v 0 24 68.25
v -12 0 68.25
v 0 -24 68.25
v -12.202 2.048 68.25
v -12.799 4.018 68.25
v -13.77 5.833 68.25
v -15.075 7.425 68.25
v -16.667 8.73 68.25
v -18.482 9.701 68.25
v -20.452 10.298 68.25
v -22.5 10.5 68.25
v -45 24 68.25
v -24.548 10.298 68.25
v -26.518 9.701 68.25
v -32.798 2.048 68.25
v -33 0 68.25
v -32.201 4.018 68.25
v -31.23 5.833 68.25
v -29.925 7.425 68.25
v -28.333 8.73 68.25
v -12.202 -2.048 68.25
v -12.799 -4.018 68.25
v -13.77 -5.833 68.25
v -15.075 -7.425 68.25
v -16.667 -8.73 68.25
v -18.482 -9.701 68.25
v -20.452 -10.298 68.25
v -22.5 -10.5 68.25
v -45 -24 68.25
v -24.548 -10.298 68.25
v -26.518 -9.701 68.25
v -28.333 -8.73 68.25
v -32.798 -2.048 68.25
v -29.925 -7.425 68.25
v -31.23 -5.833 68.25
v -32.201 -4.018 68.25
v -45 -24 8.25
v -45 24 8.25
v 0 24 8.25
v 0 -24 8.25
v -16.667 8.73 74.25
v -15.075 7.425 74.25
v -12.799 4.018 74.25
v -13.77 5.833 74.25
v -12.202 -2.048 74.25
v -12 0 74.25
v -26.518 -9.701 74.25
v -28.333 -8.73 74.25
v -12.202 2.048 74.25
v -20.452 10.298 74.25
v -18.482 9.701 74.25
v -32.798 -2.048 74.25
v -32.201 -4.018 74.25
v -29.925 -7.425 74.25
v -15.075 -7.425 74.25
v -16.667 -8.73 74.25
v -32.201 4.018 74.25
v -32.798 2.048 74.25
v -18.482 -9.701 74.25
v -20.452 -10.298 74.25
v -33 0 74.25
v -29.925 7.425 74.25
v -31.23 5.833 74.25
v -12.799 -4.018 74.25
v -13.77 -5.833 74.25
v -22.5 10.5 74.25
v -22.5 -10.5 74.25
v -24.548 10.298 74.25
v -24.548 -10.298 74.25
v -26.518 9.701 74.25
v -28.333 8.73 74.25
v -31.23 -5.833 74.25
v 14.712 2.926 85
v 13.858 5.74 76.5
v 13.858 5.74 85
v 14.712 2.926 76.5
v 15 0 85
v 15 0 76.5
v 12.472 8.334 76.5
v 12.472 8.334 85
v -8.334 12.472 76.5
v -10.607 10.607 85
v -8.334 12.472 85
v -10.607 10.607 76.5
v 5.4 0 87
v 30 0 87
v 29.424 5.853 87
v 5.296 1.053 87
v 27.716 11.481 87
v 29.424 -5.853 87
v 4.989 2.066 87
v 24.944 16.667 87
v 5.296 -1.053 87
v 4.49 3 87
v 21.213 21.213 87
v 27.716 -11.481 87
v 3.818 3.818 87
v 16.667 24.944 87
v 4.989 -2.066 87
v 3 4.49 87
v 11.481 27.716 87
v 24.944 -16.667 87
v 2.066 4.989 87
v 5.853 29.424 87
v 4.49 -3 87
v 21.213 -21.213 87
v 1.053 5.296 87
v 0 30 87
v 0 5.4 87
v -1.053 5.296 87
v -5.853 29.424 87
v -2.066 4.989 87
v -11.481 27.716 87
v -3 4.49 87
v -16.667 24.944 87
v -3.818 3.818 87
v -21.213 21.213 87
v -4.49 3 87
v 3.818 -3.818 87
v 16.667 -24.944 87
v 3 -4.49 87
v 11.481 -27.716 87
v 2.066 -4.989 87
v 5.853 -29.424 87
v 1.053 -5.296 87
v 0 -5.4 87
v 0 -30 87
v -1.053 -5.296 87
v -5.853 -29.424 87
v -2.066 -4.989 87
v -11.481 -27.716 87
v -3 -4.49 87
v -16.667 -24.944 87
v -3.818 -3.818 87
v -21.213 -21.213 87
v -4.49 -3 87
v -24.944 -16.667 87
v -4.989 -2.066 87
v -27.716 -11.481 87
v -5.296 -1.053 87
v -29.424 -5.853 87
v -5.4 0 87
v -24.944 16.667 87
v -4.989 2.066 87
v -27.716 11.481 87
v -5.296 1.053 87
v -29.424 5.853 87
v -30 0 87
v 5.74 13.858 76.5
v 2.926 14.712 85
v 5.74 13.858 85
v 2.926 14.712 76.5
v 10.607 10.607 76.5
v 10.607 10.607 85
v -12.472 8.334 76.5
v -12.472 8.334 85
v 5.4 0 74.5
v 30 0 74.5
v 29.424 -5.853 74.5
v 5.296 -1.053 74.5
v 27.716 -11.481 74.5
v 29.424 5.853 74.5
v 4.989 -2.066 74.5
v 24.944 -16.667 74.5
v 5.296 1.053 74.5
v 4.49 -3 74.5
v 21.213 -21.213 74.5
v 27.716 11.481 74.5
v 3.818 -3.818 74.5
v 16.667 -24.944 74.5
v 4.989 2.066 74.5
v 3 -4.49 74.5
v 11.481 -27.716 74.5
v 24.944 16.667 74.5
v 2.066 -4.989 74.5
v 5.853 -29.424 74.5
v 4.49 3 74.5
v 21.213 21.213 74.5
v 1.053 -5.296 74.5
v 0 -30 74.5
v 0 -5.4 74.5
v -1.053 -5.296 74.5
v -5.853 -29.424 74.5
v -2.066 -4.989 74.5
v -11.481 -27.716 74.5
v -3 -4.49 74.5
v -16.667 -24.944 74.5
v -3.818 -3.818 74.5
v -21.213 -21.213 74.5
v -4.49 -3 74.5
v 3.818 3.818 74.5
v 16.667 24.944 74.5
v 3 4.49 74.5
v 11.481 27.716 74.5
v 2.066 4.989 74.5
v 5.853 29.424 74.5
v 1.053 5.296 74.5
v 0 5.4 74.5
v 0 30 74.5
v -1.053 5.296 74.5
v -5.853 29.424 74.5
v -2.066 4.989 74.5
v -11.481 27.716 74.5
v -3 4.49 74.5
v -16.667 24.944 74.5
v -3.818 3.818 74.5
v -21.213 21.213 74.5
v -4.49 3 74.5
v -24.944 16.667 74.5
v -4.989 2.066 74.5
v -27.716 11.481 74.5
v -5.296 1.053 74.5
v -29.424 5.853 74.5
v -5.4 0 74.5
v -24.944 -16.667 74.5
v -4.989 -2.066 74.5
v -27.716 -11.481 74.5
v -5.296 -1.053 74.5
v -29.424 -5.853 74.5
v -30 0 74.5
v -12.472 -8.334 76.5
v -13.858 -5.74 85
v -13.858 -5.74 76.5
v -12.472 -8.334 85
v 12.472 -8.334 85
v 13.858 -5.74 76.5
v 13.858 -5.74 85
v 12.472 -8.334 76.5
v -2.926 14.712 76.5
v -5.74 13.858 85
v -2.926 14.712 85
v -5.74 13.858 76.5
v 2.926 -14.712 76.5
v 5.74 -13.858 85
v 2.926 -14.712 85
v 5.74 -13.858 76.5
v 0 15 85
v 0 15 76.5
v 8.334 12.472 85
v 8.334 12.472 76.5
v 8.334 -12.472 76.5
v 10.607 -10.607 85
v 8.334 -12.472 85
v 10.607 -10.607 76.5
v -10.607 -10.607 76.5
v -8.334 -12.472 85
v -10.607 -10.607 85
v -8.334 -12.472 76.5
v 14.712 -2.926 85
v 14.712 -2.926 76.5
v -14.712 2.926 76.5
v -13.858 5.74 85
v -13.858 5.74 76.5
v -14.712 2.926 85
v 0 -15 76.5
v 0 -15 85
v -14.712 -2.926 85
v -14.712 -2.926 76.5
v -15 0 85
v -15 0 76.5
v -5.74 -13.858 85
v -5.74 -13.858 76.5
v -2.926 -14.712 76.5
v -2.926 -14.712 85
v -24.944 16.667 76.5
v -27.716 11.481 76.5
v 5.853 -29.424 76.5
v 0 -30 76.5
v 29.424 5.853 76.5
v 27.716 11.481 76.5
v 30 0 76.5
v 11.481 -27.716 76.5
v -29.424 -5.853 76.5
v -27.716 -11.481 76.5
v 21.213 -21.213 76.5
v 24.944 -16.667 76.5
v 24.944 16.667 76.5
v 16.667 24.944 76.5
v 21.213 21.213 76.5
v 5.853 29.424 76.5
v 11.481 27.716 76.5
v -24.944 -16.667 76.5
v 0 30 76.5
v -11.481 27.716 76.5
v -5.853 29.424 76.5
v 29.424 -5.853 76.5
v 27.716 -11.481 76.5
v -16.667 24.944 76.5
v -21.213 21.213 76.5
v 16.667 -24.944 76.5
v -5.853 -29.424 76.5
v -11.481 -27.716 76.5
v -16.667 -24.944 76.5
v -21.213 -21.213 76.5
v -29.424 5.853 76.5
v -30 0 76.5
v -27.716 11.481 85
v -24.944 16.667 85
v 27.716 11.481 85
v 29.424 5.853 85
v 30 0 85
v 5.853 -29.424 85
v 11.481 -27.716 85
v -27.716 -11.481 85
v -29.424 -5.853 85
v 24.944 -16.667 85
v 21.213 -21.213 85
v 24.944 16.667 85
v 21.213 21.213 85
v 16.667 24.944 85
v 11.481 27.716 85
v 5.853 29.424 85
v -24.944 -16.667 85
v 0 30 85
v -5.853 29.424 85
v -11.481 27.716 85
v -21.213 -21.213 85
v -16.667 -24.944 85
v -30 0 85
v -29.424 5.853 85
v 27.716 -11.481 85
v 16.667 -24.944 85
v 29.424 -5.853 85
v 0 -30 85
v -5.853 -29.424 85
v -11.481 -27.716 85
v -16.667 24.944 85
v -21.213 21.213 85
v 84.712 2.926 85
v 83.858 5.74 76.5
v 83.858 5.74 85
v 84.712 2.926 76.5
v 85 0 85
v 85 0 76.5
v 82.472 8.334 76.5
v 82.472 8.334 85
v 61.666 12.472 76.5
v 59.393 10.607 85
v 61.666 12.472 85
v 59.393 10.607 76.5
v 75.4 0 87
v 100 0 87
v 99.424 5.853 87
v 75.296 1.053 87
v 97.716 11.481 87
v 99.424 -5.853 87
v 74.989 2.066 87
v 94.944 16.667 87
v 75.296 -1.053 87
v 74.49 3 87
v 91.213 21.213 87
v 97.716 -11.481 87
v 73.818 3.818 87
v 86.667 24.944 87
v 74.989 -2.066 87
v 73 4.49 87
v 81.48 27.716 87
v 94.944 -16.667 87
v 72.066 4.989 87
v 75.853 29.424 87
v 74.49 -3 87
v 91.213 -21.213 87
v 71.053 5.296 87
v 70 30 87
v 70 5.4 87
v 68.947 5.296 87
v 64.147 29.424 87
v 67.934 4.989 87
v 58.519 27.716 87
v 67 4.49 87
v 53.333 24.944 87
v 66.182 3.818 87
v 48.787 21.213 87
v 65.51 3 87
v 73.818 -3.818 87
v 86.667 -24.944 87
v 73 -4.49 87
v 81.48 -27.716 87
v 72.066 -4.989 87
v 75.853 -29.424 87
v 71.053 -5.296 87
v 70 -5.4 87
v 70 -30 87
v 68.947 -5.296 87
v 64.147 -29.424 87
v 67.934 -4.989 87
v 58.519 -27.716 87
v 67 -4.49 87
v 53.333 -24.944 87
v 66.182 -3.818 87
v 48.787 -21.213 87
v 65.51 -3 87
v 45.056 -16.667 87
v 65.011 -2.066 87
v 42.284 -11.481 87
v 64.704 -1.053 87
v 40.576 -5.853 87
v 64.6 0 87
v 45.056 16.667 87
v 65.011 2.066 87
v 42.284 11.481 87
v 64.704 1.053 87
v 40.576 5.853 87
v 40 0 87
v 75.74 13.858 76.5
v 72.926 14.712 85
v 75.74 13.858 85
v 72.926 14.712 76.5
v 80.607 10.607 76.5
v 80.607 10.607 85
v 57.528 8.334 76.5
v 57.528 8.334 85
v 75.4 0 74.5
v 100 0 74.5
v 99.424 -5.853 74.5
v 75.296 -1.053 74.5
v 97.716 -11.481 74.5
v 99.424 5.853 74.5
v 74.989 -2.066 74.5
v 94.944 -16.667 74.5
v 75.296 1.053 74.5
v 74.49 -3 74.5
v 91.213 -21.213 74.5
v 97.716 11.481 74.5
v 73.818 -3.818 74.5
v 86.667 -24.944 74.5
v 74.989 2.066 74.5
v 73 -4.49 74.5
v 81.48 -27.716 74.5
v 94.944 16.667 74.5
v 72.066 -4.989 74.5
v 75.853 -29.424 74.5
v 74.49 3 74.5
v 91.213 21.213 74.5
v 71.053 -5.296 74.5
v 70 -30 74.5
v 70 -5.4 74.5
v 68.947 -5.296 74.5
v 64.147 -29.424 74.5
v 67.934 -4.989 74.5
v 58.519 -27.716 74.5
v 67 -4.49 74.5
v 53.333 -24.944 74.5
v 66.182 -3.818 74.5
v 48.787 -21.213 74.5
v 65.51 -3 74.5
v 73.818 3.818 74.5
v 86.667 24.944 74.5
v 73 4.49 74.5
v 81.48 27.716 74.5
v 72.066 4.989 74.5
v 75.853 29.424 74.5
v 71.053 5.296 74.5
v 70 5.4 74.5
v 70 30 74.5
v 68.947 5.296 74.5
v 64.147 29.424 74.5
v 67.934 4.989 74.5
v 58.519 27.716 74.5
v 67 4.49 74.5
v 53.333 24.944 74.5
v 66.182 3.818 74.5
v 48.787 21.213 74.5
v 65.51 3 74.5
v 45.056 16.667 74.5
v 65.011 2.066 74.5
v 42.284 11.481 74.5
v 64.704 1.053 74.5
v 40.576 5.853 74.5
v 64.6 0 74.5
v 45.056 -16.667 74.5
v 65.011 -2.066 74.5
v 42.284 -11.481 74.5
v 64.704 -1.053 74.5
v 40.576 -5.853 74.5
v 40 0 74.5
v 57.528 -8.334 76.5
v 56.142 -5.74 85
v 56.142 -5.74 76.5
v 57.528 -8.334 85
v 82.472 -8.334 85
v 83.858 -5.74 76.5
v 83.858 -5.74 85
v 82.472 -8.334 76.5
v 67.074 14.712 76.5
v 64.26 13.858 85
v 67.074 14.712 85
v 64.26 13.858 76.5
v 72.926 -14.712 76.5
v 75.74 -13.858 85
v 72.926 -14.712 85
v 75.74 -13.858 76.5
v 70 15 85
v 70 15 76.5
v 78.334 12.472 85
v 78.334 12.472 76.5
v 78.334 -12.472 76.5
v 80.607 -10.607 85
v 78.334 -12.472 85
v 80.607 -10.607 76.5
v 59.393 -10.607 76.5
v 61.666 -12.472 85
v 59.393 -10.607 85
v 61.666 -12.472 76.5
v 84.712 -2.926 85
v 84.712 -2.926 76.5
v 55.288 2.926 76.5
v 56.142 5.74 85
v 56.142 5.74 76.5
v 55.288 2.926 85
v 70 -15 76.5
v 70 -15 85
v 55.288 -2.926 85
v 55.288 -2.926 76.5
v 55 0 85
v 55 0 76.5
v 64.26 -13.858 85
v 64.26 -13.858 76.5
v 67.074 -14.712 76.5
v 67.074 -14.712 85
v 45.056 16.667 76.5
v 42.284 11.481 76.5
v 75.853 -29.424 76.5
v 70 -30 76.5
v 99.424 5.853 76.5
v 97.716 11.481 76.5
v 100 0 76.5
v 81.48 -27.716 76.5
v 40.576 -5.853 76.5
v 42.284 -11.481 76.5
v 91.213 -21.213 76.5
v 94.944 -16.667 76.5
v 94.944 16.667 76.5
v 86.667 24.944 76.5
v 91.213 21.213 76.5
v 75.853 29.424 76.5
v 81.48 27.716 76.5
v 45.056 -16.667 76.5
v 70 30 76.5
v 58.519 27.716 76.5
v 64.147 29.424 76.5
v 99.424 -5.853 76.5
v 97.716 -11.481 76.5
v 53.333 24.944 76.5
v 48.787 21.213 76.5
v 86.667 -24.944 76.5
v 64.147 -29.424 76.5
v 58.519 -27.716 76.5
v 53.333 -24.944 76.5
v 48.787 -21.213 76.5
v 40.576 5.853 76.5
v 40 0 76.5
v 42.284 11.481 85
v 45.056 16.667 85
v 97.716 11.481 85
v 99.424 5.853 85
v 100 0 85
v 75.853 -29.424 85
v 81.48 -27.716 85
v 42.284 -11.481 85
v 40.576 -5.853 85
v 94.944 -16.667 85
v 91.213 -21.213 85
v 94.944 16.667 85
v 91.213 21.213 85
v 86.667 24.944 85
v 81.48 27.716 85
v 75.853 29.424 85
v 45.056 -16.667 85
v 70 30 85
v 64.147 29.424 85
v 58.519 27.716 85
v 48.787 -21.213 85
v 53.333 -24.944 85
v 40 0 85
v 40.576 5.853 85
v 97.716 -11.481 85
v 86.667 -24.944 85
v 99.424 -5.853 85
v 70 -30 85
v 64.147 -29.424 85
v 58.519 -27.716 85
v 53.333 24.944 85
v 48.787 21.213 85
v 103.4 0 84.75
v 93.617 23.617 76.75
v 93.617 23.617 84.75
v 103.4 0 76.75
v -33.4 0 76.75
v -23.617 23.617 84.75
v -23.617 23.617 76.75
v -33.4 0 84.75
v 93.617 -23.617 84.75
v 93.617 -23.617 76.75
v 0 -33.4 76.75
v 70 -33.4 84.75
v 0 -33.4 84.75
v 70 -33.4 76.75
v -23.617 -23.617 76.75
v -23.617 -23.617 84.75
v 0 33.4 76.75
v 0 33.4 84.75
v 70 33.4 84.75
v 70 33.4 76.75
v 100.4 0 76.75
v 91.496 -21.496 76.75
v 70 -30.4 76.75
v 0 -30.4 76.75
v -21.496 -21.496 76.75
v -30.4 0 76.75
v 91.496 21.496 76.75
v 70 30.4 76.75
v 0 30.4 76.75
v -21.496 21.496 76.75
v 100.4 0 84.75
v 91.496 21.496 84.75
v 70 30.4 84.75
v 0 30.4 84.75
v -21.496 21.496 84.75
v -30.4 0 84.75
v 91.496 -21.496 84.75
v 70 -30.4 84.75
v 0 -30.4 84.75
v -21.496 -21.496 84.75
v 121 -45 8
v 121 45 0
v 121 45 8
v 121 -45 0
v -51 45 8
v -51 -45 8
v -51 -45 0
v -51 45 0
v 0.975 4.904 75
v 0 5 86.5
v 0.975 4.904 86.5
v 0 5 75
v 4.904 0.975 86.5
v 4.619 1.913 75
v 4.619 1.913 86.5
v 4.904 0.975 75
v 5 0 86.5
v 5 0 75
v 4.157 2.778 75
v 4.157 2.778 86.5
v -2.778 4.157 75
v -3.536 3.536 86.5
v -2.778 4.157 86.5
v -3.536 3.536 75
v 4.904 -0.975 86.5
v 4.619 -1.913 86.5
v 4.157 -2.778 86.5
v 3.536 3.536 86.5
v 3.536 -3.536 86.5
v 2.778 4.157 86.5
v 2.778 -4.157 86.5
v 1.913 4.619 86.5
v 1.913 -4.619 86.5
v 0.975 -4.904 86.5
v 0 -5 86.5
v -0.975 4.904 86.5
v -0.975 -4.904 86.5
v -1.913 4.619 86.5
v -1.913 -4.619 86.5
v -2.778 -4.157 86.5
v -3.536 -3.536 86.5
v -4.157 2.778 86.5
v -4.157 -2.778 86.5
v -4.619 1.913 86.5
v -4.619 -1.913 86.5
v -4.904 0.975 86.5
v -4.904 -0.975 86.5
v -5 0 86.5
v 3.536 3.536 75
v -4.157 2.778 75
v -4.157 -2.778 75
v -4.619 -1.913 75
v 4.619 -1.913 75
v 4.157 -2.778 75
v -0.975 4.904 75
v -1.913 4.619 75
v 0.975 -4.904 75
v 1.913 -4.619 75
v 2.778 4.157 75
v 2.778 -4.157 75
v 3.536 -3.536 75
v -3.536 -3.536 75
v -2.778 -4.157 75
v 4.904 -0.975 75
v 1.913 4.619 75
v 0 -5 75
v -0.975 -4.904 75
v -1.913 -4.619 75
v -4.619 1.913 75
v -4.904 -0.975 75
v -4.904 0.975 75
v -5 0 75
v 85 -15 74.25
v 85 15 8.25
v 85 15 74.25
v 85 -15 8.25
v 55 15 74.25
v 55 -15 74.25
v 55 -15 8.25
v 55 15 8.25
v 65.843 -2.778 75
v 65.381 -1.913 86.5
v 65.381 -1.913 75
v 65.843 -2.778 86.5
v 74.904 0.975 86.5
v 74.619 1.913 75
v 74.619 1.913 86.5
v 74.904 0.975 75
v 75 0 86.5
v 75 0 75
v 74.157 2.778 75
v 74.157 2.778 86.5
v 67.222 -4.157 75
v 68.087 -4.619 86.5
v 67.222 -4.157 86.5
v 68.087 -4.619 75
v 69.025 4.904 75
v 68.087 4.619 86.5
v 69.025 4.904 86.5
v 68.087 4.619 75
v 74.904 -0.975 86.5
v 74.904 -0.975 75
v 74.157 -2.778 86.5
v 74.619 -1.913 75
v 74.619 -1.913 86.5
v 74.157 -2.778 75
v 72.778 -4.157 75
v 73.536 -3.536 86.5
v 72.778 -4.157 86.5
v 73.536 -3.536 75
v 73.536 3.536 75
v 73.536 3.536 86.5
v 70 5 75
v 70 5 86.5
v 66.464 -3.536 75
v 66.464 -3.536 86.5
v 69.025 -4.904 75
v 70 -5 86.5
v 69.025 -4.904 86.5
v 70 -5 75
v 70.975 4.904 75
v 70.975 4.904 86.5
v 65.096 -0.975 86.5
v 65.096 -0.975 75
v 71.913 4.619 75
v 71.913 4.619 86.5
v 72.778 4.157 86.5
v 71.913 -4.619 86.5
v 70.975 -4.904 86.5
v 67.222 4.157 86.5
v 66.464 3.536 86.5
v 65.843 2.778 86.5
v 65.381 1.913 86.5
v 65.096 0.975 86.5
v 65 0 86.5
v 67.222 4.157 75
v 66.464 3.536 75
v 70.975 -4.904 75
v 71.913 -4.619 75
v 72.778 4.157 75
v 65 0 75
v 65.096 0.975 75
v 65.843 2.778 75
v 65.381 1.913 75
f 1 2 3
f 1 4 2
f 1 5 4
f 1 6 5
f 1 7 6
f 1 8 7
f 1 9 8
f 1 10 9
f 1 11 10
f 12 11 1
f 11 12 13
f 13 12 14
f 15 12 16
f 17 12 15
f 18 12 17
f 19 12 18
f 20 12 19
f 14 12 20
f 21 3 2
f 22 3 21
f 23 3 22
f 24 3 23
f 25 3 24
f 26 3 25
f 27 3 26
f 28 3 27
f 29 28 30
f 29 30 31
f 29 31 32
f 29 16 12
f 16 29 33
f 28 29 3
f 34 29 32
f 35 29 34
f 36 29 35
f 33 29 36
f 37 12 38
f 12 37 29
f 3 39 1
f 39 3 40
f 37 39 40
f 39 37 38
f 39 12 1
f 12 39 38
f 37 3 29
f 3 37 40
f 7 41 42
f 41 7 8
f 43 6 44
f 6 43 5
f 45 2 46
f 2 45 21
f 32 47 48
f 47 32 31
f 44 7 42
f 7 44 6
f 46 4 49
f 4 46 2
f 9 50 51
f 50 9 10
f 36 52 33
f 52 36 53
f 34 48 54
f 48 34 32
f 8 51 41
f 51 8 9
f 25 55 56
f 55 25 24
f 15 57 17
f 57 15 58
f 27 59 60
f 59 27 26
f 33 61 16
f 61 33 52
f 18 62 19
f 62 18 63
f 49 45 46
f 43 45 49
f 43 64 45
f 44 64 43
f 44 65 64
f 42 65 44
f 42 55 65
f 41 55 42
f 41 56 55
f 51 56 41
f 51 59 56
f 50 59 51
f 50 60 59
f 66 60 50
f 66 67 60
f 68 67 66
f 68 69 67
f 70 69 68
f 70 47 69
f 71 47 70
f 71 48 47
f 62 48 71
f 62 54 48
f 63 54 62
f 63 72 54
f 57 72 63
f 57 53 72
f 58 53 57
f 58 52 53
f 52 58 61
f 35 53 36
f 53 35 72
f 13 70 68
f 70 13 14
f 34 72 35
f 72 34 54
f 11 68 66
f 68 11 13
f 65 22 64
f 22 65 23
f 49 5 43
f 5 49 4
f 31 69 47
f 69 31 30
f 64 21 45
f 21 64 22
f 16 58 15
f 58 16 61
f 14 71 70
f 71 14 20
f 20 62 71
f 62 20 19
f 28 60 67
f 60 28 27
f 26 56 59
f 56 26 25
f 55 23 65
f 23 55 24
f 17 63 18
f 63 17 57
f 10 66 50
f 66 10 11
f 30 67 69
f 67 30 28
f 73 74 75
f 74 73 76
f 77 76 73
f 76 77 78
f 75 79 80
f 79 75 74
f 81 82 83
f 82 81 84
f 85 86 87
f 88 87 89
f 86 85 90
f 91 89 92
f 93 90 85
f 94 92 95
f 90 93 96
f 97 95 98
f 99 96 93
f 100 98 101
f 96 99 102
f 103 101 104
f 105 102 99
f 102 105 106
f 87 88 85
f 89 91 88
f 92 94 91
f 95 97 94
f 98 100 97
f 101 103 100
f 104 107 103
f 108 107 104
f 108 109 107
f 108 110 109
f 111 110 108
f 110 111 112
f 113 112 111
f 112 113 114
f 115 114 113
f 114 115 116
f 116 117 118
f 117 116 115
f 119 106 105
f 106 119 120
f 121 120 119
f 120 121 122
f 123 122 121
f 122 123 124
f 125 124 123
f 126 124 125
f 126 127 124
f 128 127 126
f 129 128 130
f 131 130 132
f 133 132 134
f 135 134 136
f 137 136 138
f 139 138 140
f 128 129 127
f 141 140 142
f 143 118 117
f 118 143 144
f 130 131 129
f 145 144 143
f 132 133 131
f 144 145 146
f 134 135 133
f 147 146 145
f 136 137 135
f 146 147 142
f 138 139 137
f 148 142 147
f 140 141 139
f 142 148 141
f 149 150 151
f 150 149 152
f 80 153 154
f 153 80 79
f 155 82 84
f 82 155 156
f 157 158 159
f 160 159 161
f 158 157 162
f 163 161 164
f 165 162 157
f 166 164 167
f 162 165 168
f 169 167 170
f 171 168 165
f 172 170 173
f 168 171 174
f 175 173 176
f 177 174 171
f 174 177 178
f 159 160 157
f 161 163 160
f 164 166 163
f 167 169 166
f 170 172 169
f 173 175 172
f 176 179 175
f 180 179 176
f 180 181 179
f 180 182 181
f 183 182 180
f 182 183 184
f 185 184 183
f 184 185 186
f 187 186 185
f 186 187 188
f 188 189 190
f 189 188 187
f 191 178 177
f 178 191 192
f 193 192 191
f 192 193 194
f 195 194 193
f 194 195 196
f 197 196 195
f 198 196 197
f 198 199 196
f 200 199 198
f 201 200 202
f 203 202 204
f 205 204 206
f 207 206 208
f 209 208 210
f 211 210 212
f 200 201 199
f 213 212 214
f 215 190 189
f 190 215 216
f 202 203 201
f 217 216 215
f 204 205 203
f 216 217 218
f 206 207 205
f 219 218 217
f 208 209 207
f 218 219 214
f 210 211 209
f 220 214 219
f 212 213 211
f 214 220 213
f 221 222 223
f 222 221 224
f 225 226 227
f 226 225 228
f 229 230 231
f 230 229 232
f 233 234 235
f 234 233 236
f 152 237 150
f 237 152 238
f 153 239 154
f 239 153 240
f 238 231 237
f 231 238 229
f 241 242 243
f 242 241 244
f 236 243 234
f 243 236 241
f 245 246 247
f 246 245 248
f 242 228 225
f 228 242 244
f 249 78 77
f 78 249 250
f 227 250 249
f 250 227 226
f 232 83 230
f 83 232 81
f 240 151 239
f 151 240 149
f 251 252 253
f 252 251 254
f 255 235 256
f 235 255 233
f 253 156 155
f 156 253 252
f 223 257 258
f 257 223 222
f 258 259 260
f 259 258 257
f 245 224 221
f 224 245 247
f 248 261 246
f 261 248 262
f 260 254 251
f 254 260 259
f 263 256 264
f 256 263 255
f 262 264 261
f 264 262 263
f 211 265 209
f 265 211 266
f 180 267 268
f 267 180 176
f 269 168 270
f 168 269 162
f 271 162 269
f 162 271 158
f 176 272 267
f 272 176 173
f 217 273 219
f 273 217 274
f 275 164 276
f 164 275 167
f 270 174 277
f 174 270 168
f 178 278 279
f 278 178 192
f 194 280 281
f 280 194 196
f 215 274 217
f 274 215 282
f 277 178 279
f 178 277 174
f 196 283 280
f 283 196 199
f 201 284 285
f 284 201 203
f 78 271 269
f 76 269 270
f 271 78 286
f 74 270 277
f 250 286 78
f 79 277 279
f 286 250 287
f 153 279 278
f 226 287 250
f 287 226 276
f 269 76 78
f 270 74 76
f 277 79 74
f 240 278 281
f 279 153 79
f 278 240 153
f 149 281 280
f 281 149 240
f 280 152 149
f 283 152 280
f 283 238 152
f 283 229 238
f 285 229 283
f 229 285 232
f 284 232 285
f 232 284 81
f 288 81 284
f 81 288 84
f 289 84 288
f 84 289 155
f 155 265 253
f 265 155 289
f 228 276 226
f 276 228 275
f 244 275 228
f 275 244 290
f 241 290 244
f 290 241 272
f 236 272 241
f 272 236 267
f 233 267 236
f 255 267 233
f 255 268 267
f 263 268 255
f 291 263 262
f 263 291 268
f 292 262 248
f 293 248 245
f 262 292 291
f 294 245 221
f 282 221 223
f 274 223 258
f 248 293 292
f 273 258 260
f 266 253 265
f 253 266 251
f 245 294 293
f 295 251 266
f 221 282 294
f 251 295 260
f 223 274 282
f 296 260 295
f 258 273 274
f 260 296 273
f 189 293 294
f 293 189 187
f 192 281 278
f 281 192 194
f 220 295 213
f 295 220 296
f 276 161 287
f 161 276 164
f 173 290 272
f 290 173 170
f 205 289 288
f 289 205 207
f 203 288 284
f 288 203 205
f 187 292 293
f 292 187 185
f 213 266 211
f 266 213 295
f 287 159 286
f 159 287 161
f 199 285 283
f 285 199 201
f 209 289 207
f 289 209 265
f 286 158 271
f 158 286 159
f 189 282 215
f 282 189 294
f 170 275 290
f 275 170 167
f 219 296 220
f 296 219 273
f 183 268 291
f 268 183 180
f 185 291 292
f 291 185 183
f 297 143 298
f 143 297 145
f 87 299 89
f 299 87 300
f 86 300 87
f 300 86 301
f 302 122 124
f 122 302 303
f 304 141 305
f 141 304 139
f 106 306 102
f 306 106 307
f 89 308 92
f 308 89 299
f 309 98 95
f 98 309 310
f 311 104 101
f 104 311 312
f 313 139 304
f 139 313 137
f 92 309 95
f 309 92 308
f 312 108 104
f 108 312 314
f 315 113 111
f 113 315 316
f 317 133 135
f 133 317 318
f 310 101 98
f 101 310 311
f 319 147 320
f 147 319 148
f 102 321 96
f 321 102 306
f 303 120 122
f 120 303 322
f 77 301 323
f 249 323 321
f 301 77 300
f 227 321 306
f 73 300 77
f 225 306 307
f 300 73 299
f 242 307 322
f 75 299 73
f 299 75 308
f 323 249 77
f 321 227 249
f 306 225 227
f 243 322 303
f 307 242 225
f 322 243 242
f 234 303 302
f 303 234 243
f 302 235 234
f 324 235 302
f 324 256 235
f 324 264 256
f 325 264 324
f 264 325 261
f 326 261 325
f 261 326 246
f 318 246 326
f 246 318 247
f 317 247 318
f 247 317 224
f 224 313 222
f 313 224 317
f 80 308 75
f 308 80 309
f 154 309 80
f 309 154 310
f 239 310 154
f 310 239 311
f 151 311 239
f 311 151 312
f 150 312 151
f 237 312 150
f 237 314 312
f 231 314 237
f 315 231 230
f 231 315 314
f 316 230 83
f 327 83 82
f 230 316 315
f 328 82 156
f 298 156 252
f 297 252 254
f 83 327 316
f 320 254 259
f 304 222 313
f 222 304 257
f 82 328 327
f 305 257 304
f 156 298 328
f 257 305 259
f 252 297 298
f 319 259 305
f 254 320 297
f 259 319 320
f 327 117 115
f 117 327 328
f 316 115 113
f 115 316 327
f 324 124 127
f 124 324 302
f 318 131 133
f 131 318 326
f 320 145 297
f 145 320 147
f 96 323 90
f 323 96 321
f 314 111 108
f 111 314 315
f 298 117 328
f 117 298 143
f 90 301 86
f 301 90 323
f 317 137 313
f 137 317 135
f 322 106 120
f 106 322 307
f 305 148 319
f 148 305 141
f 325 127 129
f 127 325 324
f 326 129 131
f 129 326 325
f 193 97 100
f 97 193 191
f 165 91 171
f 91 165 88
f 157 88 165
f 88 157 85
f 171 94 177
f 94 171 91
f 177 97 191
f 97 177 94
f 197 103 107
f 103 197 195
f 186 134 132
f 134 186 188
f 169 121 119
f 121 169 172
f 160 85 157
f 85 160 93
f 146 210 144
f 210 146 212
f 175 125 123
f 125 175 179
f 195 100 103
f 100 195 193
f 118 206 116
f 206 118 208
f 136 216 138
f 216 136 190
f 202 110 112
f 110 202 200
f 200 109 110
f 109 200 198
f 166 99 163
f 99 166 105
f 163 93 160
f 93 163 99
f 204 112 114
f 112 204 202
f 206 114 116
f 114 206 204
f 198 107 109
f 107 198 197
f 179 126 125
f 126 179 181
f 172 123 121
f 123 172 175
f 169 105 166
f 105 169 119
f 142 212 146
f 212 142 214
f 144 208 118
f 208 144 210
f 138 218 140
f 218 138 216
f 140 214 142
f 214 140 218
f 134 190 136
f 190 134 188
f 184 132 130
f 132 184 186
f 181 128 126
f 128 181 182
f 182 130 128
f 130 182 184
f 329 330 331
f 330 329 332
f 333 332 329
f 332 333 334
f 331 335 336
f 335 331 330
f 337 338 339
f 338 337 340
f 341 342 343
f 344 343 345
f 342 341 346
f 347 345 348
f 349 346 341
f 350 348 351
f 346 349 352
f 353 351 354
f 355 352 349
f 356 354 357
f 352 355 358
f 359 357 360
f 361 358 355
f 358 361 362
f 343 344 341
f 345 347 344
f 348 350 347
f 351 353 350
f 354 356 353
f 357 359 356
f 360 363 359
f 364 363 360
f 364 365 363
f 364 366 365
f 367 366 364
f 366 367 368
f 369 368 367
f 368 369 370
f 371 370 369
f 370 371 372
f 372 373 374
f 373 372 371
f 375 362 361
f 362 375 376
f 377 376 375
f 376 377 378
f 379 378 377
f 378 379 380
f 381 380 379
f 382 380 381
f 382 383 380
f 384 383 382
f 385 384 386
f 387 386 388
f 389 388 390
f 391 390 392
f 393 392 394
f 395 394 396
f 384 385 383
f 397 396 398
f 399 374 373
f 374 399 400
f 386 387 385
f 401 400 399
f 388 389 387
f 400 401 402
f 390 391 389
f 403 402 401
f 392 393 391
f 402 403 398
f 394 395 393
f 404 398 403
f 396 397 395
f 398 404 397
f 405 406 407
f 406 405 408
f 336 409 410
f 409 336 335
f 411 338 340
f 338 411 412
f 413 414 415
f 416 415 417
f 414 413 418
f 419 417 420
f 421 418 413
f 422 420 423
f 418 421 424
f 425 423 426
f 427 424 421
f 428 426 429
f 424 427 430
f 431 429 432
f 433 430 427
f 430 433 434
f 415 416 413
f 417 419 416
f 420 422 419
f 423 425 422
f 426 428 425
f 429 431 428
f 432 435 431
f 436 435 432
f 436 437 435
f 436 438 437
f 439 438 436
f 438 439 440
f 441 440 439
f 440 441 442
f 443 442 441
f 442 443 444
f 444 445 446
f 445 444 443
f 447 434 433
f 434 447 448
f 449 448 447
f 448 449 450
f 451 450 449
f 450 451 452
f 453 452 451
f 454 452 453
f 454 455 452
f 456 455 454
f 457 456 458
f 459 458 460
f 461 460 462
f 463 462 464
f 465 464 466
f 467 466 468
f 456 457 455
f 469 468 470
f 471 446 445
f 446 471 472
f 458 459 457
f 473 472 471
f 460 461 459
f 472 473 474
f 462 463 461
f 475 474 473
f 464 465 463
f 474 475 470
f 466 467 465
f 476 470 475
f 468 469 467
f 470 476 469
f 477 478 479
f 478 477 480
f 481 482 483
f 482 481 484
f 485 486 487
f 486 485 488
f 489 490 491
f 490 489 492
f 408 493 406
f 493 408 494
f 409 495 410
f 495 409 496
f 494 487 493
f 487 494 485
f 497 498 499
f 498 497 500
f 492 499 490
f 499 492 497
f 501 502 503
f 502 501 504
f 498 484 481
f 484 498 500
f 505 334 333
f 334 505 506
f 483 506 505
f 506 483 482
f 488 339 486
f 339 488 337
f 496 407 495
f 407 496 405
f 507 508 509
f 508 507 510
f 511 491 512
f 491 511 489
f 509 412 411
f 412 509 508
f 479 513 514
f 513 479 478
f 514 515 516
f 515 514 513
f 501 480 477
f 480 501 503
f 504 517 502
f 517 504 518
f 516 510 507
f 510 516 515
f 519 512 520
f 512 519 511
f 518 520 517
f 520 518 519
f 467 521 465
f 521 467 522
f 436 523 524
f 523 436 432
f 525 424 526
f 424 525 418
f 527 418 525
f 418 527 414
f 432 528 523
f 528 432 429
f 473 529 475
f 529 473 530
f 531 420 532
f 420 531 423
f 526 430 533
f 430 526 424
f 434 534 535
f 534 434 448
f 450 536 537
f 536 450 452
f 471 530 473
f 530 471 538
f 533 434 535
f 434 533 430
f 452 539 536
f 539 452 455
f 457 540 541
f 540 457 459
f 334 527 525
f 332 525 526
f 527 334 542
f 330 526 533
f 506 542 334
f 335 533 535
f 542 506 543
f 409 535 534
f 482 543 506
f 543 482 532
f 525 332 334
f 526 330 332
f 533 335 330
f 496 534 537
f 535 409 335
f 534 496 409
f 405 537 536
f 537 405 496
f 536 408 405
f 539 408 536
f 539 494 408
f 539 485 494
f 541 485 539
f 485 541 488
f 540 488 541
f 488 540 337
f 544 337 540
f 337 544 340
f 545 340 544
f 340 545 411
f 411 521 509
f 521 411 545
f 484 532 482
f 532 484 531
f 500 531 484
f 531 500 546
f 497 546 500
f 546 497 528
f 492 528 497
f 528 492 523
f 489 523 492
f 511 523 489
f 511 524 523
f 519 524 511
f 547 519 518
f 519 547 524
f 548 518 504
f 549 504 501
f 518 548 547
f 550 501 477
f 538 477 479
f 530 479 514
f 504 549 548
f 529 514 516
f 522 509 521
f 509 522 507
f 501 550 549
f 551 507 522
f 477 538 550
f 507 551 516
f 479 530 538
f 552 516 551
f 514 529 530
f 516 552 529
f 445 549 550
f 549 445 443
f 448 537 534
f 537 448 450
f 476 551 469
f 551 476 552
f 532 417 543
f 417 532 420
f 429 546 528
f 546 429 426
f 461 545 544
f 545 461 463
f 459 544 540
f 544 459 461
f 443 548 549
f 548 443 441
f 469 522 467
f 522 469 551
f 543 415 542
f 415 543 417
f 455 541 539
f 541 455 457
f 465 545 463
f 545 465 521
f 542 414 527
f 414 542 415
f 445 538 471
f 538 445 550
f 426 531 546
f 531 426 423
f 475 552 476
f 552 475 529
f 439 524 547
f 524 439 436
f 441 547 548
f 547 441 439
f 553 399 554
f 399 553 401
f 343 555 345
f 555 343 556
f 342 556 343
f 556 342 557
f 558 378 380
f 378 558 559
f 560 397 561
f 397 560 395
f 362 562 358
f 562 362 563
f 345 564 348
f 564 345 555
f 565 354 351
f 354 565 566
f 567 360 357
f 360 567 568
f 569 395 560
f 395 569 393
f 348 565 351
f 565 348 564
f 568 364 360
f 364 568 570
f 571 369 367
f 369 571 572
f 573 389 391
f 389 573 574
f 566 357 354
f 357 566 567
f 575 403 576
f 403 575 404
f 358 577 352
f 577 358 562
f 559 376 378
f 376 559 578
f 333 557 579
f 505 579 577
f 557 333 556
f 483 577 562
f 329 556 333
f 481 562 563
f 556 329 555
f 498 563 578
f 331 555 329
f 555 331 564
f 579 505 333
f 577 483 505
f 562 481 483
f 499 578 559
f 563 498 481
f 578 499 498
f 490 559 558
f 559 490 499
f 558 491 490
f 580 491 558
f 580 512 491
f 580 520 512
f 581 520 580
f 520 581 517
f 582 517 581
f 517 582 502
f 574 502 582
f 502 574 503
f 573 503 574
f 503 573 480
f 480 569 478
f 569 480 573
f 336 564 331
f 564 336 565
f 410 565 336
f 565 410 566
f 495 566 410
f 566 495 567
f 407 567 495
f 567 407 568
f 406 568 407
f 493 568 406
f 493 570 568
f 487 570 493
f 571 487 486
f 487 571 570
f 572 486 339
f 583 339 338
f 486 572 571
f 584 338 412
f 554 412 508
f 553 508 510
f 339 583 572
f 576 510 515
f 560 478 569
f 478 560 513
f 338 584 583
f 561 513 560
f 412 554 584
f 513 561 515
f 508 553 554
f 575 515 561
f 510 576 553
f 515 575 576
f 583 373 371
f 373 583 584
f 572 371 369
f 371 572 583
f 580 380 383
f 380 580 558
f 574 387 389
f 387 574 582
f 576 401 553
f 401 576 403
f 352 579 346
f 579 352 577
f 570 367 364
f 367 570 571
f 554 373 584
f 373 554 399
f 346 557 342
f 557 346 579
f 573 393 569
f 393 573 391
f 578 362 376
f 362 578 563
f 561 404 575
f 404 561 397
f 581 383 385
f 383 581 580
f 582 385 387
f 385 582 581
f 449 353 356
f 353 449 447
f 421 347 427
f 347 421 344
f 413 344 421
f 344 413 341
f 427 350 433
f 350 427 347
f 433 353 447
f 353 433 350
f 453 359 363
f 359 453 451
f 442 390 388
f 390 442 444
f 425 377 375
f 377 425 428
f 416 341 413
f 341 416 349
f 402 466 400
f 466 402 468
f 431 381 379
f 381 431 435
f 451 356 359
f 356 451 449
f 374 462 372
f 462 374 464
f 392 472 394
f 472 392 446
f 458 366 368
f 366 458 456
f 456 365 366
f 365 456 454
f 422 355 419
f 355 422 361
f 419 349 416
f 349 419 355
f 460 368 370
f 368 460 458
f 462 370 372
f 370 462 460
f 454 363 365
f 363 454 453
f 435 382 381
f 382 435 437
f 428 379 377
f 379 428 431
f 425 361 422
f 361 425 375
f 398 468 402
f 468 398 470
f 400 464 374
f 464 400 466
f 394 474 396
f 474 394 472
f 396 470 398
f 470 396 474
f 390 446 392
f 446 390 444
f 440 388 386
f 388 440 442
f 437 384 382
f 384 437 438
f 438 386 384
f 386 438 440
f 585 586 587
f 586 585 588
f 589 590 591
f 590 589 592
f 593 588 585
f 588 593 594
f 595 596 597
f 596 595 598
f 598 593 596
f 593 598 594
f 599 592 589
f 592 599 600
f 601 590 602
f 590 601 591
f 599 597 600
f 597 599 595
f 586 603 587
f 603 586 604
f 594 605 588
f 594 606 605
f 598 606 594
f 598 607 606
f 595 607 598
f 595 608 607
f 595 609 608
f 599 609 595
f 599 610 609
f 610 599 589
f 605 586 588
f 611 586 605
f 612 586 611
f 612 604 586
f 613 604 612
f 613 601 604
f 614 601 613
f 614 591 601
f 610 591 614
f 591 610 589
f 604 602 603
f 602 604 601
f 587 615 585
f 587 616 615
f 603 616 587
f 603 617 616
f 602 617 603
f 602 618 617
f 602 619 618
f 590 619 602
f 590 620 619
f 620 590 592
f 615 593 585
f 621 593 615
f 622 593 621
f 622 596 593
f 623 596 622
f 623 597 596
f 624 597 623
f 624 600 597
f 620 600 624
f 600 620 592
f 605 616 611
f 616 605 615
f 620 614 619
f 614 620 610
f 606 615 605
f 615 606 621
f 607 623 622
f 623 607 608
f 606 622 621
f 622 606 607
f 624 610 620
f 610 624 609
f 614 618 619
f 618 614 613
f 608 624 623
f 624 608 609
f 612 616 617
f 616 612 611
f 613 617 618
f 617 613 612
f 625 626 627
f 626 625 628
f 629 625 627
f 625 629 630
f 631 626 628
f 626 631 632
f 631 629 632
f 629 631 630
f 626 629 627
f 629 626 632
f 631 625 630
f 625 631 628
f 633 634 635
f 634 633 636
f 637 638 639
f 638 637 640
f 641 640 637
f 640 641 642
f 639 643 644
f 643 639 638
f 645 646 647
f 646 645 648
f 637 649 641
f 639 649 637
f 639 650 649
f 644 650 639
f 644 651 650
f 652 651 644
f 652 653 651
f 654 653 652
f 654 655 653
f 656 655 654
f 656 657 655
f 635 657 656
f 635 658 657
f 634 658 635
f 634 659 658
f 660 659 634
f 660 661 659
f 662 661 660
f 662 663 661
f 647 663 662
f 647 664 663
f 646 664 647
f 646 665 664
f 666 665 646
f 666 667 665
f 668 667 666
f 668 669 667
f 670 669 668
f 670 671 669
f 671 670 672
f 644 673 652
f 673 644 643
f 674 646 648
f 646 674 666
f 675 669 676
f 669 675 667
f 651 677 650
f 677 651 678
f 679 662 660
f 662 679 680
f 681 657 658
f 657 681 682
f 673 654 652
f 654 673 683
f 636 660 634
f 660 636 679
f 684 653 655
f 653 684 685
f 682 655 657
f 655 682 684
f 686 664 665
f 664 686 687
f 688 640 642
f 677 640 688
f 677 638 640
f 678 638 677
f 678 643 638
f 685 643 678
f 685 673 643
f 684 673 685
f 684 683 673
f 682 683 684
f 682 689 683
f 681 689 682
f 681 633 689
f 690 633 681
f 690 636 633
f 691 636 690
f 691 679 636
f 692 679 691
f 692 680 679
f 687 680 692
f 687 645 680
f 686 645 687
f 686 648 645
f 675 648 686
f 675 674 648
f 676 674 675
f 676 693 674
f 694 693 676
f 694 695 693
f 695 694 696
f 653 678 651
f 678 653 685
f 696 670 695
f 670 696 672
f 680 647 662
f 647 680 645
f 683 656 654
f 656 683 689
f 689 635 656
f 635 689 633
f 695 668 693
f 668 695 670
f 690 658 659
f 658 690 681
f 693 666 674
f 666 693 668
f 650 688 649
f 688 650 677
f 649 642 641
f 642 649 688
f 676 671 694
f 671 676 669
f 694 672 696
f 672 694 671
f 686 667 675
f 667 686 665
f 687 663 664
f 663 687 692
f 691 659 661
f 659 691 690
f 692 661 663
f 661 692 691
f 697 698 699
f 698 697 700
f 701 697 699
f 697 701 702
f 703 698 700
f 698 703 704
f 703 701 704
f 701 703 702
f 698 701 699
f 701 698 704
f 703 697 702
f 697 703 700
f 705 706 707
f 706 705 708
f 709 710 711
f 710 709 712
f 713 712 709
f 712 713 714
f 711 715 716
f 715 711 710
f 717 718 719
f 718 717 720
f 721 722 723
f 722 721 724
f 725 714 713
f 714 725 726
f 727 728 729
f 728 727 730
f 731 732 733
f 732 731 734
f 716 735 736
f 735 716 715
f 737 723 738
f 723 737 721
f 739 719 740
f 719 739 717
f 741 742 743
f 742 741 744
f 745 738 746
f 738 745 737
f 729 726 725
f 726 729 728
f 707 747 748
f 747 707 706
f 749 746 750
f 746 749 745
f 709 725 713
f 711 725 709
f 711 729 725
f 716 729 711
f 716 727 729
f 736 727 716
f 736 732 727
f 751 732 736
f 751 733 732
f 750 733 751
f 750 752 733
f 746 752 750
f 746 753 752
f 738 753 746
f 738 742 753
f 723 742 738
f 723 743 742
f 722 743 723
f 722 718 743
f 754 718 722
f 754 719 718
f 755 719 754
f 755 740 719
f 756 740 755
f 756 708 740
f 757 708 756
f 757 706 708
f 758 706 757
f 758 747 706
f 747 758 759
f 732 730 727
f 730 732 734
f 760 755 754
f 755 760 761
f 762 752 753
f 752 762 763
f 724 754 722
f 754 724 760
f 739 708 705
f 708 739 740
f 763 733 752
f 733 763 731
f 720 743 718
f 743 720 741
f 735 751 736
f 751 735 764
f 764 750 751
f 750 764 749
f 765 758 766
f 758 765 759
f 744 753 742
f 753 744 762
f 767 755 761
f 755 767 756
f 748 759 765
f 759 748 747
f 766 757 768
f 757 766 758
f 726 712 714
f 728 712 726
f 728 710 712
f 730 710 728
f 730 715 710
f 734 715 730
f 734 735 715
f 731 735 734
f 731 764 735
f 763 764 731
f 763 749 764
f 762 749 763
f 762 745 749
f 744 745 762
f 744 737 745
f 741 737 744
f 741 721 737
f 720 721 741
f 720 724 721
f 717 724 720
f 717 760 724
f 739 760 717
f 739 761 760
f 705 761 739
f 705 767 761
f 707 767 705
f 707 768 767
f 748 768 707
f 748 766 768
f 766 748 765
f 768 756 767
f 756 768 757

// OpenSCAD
$fn = 32;

// ------------------------------------------------------------------------
// Motor belt drive: span 70 mm, pulleys d60, belt 8 mm wide
// Every part is its own module, assembly() places every instance.
// ------------------------------------------------------------------------

// --- part 1 ---
module base_plate() {
  difference() {
    translate([-86, -45, 0]) cube([172, 90, 8]);
  }
}

// --- part 2 ---
module motor() {
  union() {
    translate([-30, -24, 0]) cube([60, 48, 45]);
    translate([33, 0, 22.5]) rotate([0, 90, 0]) cylinder(h = 6, d = 21, center = true);
  }
}

// --- part 3 ---
module drive_shaft() {
  translate([0, 0, -5.75]) cylinder(h = 11.5, d = 10);
}

// --- part 4 ---
module pulley_drive() {
  difference() {
    union() {
      cylinder(h = 12.5, d = 30);
      cylinder(h = 2, d = 60);
      translate([0, 0, 10.5]) cylinder(h = 2, d = 60);
    }
    translate([0, 0, -1]) cylinder(h = 14.5, d = 10.8);
  }
}

// --- part 5 ---
module idler_post() {
  translate([-15, -15, 0]) cube([30, 30, 66]);
}

// --- part 6 ---
module driven_shaft() {
  translate([0, 0, -5.75]) cylinder(h = 11.5, d = 10);
}

// --- part 7 ---
module pulley_driven() {
  difference() {
    union() {
      cylinder(h = 12.5, d = 30);
      cylinder(h = 2, d = 60);
      translate([0, 0, 10.5]) cylinder(h = 2, d = 60);
    }
    translate([0, 0, -1]) cylinder(h = 14.5, d = 10.8);
  }
}

// --- part 8 ---
module drive_belt() {
  difference() {
    linear_extrude(height = 8) polygon(points = concat([for (a = [90 : 45 : 270]) [33.4 * cos(a), 33.4 * sin(a)]], [for (a = [270 : 45 : 450]) [70 + 33.4 * cos(a), 33.4 * sin(a)]]));
    translate([0, 0, -1]) linear_extrude(height = 10) polygon(points = concat([for (a = [90 : 45 : 270]) [30.4 * cos(a), 30.4 * sin(a)]], [for (a = [270 : 45 : 450]) [70 + 30.4 * cos(a), 30.4 * sin(a)]]));
  }
}

// --- assembly ---
module assembly() {
  color([0.80, 0.24, 0.20]) translate([35, 0, 0]) rotate([0, 0, 0]) base_plate();
  color([0.20, 0.45, 0.75]) translate([0, 0, 38.25]) rotate([0, 270, 0]) motor();
  color([0.25, 0.62, 0.32]) translate([0, 0, 80.75]) rotate([0, 0, 0]) drive_shaft();
  color([0.92, 0.70, 0.18]) translate([0, 0, 74.5]) rotate([0, 0, 0]) pulley_drive();
  color([0.58, 0.35, 0.70]) translate([70, 0, 8.25]) rotate([0, 0, 0]) idler_post();
  color([0.16, 0.66, 0.66]) translate([70, 0, 80.75]) rotate([0, 0, 0]) driven_shaft();
  color([0.85, 0.48, 0.18]) translate([70, 0, 74.5]) rotate([0, 0, 0]) pulley_driven();
  color([0.55, 0.60, 0.65]) translate([0, 0, 76.75]) rotate([0, 0, 0]) drive_belt();
}

assembly();
